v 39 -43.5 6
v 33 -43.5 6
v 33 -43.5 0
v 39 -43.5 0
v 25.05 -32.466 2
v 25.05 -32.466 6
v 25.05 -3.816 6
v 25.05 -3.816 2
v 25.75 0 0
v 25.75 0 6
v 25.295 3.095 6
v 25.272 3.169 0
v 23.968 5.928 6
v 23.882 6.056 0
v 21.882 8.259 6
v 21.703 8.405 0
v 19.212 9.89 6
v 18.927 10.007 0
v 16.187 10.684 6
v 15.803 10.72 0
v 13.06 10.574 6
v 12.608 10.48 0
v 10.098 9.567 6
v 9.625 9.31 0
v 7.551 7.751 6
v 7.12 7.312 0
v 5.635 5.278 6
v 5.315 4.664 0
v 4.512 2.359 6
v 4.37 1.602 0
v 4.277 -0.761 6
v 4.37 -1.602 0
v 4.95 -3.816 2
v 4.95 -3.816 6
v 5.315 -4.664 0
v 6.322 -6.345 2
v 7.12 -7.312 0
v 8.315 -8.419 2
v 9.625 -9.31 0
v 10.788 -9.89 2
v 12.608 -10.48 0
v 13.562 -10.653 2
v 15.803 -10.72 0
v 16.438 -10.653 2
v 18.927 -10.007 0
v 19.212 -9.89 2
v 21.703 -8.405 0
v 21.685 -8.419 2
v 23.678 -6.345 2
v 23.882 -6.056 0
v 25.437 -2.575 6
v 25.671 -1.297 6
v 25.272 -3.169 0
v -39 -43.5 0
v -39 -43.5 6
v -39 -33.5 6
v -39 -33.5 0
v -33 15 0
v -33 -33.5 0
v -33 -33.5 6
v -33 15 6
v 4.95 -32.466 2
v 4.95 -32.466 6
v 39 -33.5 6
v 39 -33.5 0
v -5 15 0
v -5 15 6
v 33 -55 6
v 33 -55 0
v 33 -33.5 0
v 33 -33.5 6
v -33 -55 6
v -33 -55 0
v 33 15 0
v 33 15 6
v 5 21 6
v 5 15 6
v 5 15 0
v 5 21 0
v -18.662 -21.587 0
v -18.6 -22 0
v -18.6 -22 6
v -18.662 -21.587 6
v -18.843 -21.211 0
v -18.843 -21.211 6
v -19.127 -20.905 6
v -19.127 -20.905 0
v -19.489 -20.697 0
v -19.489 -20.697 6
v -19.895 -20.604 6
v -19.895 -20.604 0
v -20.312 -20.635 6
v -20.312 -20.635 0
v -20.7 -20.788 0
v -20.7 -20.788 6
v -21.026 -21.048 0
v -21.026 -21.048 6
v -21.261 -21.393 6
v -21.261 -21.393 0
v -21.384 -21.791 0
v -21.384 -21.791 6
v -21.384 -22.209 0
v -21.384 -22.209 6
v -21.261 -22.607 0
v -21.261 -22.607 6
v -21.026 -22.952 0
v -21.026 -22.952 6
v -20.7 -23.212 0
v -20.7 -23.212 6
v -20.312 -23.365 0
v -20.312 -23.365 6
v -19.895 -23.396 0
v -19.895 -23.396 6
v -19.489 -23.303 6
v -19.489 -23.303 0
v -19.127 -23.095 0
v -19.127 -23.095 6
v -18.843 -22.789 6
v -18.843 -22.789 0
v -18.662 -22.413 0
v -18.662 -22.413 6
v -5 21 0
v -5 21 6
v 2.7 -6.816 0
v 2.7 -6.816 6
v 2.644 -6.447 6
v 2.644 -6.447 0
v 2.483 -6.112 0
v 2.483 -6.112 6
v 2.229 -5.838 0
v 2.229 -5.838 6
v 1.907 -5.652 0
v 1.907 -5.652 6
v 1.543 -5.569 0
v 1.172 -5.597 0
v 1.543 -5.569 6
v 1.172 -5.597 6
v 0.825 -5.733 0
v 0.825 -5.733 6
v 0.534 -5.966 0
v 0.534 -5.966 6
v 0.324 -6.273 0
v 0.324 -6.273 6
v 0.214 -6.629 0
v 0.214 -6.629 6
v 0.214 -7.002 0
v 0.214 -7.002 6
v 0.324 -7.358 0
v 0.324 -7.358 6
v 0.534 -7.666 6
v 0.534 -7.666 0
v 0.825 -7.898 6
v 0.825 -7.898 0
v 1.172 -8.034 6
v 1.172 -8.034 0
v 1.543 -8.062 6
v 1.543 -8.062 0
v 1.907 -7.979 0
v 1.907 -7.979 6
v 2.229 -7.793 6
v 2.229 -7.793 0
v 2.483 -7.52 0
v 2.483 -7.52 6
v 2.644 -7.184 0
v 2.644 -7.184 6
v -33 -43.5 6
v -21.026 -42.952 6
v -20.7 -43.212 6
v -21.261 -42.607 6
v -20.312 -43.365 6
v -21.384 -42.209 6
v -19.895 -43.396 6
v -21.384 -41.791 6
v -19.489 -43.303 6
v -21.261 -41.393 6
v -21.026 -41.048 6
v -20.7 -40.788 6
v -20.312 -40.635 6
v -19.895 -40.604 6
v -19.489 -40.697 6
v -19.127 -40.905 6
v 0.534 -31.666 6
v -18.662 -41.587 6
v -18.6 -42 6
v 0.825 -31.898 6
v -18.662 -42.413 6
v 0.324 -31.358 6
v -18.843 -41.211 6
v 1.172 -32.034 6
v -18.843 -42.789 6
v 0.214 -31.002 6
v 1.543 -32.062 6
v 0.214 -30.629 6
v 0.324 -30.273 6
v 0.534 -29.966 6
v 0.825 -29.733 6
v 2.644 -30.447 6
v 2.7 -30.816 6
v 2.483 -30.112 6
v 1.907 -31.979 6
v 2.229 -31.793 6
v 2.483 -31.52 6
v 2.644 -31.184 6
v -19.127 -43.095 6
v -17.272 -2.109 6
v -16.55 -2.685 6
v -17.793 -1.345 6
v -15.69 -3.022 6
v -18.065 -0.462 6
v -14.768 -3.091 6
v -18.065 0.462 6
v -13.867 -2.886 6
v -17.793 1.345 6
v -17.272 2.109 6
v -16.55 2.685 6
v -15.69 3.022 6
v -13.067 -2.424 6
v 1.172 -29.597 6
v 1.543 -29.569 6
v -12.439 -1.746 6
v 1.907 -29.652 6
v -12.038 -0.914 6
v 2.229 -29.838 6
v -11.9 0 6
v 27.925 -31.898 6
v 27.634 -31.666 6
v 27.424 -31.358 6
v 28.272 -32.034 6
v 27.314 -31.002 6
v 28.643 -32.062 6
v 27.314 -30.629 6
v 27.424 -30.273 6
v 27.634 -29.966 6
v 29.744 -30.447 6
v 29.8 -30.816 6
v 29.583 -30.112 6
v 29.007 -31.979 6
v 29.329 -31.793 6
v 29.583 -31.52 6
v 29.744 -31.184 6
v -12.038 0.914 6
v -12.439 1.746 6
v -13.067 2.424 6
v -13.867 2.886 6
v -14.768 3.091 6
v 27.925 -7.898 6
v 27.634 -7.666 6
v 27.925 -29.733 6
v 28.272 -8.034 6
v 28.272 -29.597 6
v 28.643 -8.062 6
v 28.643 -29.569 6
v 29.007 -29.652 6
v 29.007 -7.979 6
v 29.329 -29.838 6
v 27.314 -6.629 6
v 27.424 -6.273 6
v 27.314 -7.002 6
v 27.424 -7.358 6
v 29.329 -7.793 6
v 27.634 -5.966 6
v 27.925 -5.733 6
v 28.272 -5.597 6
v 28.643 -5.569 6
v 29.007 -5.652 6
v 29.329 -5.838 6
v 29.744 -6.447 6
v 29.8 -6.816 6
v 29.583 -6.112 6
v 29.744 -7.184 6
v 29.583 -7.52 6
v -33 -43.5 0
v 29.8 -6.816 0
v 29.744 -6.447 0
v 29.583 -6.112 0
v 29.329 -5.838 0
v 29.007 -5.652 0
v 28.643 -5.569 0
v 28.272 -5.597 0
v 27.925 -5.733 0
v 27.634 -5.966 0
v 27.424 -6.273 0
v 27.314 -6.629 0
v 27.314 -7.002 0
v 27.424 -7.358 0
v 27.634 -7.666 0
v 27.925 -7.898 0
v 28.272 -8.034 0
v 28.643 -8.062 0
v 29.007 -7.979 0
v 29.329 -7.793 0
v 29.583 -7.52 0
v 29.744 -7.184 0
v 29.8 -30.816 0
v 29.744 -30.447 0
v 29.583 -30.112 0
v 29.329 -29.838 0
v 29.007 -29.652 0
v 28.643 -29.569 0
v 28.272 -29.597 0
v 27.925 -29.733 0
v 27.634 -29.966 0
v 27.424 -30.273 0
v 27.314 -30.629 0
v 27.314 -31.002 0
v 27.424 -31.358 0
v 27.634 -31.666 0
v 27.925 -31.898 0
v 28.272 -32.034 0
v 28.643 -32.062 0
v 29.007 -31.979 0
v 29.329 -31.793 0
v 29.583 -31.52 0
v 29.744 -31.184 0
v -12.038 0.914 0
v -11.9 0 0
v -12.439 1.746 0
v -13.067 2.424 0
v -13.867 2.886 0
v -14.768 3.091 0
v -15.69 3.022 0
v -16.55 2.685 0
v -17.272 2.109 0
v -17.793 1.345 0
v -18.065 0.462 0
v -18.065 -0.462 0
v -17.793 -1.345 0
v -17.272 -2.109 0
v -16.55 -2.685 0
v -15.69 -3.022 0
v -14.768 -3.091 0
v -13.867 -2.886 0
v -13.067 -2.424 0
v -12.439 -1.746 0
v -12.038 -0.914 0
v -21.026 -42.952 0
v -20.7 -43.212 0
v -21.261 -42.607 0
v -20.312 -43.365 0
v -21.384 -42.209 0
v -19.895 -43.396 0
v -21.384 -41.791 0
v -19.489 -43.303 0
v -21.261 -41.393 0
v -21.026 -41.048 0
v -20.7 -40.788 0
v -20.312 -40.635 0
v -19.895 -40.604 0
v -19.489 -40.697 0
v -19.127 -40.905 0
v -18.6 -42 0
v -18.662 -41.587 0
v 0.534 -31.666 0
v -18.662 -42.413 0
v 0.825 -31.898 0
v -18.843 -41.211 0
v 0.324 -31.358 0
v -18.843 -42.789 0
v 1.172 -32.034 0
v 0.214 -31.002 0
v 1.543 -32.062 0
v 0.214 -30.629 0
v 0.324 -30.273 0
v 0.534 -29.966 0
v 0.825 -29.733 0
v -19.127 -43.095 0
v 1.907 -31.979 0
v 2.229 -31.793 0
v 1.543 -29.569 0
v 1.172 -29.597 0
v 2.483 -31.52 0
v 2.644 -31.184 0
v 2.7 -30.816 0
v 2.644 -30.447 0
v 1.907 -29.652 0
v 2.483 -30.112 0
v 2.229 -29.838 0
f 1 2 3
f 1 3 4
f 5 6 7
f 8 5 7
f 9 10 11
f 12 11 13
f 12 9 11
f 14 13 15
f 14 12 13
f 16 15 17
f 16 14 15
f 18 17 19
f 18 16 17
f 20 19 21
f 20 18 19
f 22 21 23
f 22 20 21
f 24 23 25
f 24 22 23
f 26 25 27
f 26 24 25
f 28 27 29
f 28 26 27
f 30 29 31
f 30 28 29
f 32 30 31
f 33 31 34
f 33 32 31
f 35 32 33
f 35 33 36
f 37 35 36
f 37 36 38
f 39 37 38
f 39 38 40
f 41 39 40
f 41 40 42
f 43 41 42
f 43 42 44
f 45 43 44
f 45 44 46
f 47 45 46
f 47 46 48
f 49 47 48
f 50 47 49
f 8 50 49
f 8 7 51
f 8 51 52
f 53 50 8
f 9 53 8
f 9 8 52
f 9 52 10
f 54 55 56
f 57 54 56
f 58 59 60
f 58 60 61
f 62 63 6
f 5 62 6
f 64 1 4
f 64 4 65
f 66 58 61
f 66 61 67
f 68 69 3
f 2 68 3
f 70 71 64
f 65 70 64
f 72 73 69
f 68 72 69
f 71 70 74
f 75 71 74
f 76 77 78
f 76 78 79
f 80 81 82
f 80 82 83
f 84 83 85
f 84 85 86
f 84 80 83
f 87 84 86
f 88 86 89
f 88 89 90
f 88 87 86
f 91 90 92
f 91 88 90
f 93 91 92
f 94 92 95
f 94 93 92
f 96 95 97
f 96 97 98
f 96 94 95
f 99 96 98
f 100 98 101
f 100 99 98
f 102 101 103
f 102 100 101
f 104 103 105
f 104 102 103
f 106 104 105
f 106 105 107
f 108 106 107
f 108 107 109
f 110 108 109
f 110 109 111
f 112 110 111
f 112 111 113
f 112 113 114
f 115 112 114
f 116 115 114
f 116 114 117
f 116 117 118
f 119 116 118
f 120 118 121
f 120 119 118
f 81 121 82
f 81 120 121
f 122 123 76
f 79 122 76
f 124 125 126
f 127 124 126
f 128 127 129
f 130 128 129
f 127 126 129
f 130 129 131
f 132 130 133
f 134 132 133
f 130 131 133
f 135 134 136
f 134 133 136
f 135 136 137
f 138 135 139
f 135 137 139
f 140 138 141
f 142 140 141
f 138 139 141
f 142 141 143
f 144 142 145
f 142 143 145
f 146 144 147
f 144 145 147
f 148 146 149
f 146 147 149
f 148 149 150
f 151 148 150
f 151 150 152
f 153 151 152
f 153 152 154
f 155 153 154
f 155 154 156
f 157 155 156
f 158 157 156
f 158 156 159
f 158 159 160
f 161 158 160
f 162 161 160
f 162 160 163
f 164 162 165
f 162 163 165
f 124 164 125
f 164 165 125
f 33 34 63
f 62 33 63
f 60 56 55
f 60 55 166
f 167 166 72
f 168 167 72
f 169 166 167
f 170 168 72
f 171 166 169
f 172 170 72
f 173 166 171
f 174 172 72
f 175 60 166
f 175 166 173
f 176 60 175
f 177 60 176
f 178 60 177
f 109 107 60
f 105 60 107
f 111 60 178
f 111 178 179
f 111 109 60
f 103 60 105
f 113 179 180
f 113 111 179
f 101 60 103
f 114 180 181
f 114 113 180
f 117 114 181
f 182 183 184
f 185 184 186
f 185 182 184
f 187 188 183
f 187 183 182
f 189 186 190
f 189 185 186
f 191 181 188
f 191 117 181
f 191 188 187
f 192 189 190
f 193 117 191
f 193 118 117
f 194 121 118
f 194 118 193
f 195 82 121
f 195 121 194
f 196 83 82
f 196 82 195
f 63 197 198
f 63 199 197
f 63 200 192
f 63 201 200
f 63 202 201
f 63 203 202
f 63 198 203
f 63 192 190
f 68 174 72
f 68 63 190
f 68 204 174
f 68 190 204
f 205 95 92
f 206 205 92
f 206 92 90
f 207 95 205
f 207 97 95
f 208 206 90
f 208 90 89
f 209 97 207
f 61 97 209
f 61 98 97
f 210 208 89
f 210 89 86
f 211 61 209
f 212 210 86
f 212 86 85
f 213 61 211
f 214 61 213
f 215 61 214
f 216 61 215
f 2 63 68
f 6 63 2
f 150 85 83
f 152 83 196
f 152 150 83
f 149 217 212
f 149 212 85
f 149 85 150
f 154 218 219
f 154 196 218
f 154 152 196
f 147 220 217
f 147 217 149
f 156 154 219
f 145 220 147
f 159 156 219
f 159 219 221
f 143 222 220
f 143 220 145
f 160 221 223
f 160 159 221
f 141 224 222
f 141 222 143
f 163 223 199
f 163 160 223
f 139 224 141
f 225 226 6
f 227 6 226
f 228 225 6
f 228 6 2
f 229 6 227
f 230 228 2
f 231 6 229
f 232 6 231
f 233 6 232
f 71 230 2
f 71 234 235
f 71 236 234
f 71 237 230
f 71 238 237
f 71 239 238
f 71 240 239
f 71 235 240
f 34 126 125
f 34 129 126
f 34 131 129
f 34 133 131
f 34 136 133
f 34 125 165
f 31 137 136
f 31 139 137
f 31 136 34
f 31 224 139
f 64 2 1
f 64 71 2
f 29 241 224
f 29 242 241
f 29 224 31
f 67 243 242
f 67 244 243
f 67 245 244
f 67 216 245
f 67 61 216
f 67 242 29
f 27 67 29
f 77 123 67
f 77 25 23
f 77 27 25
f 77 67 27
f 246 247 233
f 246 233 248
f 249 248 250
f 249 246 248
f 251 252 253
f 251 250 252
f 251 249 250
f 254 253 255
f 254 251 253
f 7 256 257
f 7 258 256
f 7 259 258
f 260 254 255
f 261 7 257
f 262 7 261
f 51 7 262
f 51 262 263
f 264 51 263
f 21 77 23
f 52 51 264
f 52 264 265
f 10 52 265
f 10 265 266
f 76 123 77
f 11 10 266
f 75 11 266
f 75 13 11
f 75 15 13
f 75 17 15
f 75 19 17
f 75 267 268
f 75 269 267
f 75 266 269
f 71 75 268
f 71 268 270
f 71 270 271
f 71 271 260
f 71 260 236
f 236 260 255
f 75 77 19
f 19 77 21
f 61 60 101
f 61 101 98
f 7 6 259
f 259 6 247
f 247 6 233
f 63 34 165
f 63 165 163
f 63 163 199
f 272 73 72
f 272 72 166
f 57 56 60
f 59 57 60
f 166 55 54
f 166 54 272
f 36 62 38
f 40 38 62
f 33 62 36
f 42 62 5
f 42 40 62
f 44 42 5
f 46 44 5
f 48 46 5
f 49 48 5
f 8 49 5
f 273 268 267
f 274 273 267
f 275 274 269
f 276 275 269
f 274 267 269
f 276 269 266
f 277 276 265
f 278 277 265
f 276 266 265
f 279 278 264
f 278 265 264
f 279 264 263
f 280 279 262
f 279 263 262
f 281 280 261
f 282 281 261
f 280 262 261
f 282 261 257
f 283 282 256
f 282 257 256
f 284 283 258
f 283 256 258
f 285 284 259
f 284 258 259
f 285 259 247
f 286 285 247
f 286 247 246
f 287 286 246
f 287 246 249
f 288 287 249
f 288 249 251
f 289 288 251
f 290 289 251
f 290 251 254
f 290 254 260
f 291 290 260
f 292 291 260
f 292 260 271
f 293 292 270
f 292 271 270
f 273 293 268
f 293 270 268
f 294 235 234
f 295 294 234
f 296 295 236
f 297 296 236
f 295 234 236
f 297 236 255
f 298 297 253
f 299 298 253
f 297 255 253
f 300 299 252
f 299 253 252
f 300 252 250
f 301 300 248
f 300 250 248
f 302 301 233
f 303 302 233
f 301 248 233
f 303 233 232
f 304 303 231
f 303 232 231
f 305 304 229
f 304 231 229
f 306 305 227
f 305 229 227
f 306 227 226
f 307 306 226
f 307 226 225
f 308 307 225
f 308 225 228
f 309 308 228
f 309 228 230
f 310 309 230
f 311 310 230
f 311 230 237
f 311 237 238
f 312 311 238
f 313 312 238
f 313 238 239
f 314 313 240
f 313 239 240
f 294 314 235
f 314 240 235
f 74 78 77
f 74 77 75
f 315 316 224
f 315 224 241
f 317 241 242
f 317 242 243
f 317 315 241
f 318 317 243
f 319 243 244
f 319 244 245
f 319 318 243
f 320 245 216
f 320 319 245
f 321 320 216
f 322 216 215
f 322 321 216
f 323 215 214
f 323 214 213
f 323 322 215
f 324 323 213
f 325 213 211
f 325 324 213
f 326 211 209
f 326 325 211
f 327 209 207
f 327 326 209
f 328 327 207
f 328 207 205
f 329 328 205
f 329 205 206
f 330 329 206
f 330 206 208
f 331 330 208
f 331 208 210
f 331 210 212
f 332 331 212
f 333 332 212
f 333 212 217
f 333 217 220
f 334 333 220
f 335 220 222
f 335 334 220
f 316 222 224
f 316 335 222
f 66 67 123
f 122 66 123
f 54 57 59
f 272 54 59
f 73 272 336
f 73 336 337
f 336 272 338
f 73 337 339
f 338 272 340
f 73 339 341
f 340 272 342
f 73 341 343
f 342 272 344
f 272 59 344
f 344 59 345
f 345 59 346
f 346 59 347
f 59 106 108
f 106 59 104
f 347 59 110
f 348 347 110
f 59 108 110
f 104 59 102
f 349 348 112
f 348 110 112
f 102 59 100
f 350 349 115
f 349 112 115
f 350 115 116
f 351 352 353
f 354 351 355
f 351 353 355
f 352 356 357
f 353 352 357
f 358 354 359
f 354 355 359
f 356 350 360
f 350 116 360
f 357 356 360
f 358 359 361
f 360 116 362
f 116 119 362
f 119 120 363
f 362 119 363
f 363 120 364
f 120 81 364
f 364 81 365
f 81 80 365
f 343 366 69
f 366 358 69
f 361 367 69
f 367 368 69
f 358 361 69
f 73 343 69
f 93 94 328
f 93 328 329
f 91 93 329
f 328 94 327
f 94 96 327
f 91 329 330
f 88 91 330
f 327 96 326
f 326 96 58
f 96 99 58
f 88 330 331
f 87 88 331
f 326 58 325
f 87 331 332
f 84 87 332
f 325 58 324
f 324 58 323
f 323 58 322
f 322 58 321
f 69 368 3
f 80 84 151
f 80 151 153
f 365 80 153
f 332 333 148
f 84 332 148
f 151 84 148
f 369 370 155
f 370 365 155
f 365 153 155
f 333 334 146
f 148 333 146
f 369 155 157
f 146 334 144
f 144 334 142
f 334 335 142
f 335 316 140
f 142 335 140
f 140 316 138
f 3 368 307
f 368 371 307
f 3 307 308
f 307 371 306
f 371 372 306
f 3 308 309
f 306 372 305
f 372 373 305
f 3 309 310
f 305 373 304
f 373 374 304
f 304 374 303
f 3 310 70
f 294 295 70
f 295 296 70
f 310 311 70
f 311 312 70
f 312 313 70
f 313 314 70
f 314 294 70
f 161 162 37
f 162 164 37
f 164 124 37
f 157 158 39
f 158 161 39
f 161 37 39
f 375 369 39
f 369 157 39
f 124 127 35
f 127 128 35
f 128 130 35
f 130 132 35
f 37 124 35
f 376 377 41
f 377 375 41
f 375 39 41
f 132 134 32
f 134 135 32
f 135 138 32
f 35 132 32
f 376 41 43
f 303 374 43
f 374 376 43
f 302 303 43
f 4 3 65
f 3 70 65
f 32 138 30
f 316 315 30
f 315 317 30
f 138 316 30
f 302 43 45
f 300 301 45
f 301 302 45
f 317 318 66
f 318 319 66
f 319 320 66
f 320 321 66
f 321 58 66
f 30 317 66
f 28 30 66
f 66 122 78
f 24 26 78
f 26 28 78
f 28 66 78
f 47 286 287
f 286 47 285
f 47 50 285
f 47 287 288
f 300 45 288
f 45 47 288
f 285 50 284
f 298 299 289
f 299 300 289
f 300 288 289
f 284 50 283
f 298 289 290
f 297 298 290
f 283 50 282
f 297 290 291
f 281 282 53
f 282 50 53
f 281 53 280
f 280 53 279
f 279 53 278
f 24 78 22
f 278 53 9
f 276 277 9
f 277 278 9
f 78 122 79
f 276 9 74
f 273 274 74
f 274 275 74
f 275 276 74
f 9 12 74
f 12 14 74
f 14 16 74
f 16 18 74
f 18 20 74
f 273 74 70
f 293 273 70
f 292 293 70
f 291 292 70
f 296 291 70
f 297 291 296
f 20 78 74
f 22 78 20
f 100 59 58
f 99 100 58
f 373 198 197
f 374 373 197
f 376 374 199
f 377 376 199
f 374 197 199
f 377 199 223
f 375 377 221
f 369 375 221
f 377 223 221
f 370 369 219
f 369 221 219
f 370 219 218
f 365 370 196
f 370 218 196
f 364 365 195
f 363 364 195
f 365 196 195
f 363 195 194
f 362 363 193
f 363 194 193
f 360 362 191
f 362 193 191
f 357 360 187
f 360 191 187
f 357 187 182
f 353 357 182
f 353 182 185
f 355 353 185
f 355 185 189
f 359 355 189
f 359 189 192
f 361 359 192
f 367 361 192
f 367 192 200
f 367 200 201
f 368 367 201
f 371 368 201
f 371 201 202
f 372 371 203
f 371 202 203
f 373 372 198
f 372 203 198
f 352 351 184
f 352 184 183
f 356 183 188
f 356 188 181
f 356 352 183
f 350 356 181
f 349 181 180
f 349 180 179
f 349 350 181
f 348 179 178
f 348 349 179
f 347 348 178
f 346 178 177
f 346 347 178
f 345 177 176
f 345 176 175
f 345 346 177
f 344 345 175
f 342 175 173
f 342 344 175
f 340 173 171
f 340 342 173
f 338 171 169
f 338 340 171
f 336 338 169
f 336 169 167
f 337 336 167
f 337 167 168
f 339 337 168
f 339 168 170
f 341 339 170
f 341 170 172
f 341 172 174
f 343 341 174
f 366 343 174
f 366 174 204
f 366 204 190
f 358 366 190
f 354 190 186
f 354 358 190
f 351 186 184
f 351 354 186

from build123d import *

# Parameters (mm, degrees)
ESQUISSE1_W             = 66
ESQUISSE1_H             = 70
ESQUISSE1_R             = 10.75
ESQUISSE1_R_2           = 1.4
ESQUISSE1_R_3           = 3.1
BOSS_EXTRU_1_DEPTH      = 6
ESQUISSE2_W             = 10
ESQUISSE2_H             = 6
ESQUISSE2_W_2           = 6
ESQUISSE2_H_2           = 10
BOSS_EXTRU_3_DEPTH      = 6
ENL_V_MAT_EXTRU_3_DEPTH = 4
ESQUISSE4_R             = 1.25
ENL_V_MAT_EXTRU_4_DEPTH = 6


with BuildPart() as part:
    # Esquisse1 → Boss.-Extru.1 (new body)
    with BuildSketch(Plane.XY):
        with Locations((0, -20)):
            Rectangle(ESQUISSE1_W, ESQUISSE1_H)
        with Locations((15, 0)):
            Circle(ESQUISSE1_R, mode=Mode.SUBTRACT)
        with Locations((-20, -42)):
            Circle(ESQUISSE1_R_2, mode=Mode.SUBTRACT)
        with Locations((-20, -22)):
            Circle(ESQUISSE1_R_2, mode=Mode.SUBTRACT)
        with Locations((-15, 0)):
            Circle(ESQUISSE1_R_3, mode=Mode.SUBTRACT)
    extrude(amount=BOSS_EXTRU_1_DEPTH)

    # Esquisse2 → Boss.-Extru.3 (add)
    with BuildSketch(Plane.XY.offset(6)):
        with Locations((0, 18)):
            Rectangle(ESQUISSE2_W, ESQUISSE2_H)
        with Locations((-36, -38.5)):
            Rectangle(ESQUISSE2_W_2, ESQUISSE2_H_2)
        with Locations((36, -38.5)):
            Rectangle(ESQUISSE2_W_2, ESQUISSE2_H_2)
    extrude(amount=-BOSS_EXTRU_3_DEPTH)

    # Esquisse3 → Enlèv. mat.-Extru.3 (cut)
    with BuildSketch(Plane.XY.offset(6)):
        with BuildLine():
            Line((4.95, -3.815756806), (4.95, -32.465756806))
            Line((4.95, -32.465756806), (25.05, -32.465756806))
            Line((25.05, -32.465756806), (25.05, -3.815756806))
            ThreePointArc((25.05, -3.815756806), (15, -10.75), (4.95, -3.815756806))
        make_face()
    extrude(amount=-ENL_V_MAT_EXTRU_3_DEPTH, mode=Mode.SUBTRACT)

    # Esquisse4 → Enlèv. mat.-Extru.4 (cut)
    with BuildSketch(Plane.XY.offset(6)):
        with Locations((28.55, -6.815756806)):
            Circle(ESQUISSE4_R)
        with Locations((28.55, -30.815756806)):
            Circle(ESQUISSE4_R)
        with Locations((1.45, -30.815756806)):
            Circle(ESQUISSE4_R)
        with Locations((1.45, -6.815756806)):
            Circle(ESQUISSE4_R)
    extrude(amount=-ENL_V_MAT_EXTRU_4_DEPTH, mode=Mode.SUBTRACT)


solid = part.part
